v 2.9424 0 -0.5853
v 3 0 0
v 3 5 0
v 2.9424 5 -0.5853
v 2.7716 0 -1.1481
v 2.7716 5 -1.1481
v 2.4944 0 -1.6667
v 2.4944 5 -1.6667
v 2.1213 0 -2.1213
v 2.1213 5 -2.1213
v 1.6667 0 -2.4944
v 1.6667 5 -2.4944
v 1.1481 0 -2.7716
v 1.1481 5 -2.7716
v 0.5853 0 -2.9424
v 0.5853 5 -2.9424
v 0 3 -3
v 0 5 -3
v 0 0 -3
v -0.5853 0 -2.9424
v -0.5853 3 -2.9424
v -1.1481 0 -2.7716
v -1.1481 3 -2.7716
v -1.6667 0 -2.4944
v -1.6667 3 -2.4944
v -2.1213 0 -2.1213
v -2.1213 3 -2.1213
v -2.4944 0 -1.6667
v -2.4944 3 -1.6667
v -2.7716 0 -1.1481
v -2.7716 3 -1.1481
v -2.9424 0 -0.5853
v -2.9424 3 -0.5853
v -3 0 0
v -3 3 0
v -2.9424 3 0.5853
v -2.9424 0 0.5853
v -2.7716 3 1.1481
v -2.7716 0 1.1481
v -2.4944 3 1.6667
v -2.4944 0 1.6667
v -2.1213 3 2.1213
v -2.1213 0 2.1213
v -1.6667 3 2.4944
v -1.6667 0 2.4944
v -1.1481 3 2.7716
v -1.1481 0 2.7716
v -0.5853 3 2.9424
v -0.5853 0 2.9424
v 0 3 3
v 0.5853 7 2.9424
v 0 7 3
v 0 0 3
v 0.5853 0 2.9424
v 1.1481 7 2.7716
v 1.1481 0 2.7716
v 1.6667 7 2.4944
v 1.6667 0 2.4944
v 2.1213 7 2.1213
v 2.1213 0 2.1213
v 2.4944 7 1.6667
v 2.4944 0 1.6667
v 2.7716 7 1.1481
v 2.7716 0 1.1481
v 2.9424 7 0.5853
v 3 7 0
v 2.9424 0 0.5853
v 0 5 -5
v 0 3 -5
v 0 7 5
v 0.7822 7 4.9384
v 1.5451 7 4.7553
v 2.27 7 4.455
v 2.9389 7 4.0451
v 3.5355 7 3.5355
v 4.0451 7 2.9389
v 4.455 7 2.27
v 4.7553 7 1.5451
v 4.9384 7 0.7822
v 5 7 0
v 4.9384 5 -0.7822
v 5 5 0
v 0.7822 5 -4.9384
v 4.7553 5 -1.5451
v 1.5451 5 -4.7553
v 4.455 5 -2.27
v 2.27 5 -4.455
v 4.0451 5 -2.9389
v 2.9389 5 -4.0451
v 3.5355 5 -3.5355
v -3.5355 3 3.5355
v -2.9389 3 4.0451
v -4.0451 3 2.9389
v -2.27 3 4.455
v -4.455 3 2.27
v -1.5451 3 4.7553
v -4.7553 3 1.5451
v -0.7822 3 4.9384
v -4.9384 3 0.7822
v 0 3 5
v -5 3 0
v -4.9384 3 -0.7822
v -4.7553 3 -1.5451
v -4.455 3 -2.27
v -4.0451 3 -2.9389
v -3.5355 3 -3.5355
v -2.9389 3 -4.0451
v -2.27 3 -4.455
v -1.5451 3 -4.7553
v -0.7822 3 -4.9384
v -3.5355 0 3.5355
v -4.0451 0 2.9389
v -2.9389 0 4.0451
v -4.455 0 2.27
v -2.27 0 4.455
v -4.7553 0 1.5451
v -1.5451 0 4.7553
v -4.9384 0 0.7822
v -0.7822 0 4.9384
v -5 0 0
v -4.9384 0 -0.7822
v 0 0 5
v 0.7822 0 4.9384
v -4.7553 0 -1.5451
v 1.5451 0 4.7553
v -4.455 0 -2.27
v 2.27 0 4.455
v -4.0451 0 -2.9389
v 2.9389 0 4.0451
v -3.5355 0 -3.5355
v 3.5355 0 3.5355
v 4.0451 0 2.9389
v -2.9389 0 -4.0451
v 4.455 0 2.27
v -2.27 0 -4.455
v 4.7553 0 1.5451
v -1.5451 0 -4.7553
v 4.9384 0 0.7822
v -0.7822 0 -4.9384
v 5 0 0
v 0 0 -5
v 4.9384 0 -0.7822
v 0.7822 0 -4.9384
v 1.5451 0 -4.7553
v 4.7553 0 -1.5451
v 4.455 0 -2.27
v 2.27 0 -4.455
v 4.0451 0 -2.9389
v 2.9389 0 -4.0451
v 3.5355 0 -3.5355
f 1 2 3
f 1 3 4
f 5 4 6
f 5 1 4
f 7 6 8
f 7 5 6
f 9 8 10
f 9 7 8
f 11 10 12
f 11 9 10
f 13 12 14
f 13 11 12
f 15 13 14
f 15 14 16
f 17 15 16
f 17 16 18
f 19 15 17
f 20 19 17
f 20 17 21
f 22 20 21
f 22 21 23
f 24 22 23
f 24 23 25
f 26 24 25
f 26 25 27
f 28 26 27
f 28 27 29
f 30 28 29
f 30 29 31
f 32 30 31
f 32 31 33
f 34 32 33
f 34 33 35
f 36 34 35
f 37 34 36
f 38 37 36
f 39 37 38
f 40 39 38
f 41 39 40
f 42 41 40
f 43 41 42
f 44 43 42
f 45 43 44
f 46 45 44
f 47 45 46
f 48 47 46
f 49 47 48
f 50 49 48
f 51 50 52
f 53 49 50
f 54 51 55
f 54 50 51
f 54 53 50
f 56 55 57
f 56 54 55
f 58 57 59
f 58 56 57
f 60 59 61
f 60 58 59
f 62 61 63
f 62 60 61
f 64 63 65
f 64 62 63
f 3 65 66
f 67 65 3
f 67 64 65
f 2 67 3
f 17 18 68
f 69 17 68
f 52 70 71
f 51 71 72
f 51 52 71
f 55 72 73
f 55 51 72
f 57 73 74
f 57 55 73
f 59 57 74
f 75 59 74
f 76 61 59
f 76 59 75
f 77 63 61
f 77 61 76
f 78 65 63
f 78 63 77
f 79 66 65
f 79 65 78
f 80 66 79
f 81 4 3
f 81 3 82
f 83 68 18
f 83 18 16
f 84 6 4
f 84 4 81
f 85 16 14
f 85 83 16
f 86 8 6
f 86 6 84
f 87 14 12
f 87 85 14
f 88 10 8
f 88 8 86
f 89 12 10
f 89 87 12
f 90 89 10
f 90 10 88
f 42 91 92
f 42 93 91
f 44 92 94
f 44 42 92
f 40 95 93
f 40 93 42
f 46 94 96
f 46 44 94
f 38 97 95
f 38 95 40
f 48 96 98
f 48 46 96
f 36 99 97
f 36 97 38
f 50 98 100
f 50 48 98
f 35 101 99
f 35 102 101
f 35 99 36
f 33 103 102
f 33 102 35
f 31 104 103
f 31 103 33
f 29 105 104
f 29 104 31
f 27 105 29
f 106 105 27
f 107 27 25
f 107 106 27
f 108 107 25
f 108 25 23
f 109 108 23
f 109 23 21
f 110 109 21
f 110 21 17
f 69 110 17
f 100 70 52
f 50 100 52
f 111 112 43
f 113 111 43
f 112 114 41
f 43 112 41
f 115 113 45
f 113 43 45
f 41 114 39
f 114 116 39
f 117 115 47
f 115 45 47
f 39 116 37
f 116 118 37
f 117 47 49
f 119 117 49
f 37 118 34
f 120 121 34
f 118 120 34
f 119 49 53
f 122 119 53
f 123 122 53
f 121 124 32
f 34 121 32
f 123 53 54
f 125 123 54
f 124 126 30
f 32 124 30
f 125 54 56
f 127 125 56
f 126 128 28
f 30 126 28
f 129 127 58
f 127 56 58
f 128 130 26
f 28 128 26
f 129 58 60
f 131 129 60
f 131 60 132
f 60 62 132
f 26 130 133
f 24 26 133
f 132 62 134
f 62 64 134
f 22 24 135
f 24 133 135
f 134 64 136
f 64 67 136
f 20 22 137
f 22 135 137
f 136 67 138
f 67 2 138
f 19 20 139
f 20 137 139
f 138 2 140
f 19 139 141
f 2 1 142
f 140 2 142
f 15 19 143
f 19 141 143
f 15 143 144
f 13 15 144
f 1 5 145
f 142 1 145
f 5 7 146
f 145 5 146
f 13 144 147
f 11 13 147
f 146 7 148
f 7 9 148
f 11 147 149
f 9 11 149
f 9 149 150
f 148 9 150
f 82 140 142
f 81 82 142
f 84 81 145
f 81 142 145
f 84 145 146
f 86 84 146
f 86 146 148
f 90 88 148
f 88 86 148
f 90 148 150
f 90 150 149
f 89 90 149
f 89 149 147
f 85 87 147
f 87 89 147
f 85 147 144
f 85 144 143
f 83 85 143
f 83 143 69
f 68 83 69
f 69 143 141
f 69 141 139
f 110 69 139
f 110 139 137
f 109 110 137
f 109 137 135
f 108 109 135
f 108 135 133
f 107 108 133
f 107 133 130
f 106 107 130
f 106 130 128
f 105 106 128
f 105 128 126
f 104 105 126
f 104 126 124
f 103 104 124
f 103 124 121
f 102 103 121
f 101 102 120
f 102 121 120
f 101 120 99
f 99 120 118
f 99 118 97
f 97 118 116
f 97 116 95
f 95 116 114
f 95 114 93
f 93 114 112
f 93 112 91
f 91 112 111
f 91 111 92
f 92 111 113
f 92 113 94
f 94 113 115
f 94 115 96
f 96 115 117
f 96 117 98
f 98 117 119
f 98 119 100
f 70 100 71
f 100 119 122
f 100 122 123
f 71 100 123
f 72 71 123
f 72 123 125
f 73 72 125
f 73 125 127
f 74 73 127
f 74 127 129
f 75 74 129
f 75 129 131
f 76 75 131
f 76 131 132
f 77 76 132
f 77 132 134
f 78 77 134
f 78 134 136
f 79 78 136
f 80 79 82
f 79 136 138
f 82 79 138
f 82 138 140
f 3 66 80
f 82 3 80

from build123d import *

# Parameters (mm, degrees)
SKETCH1_R           = 5
SKETCH1_R_2         = 3
BOSS_EXTRUDE1_DEPTH = 7
SKETCH3_W           = 6.288888245
SKETCH3_H           = 10.422150442
CUT_EXTRUDE1_DEPTH  = 4
SKETCH4_W           = 5
SKETCH4_H           = 5
CUT_EXTRUDE2_DEPTH  = 2


with BuildPart() as part:
    # Sketch1 → Boss-Extrude1 (new body)
    with BuildSketch(Plane(origin=(0, 0, 0), x_dir=(1, 0, 0), z_dir=(0, 1, 0))):
        Circle(SKETCH1_R)
        Circle(SKETCH1_R_2, mode=Mode.SUBTRACT)
    extrude(amount=BOSS_EXTRUDE1_DEPTH)

    # Sketch3 → Cut-Extrude1 (cut)
    with BuildSketch(Plane(origin=(0, 7, 0), x_dir=(1, 0, 0), z_dir=(0, 1, 0))):
        with Locations((-3.144444123, -0.211075221)):
            Rectangle(SKETCH3_W, SKETCH3_H)
    extrude(amount=-CUT_EXTRUDE1_DEPTH, mode=Mode.SUBTRACT)

    # Sketch4 → Cut-Extrude2 (cut)
    with BuildSketch(Plane(origin=(0, 7, 0), x_dir=(1, 0, 0), z_dir=(0, 1, 0))):
        with Locations((2.5, 2.5)):
            Rectangle(SKETCH4_W, SKETCH4_H)
    extrude(amount=-CUT_EXTRUDE2_DEPTH, mode=Mode.SUBTRACT)


solid = part.part
